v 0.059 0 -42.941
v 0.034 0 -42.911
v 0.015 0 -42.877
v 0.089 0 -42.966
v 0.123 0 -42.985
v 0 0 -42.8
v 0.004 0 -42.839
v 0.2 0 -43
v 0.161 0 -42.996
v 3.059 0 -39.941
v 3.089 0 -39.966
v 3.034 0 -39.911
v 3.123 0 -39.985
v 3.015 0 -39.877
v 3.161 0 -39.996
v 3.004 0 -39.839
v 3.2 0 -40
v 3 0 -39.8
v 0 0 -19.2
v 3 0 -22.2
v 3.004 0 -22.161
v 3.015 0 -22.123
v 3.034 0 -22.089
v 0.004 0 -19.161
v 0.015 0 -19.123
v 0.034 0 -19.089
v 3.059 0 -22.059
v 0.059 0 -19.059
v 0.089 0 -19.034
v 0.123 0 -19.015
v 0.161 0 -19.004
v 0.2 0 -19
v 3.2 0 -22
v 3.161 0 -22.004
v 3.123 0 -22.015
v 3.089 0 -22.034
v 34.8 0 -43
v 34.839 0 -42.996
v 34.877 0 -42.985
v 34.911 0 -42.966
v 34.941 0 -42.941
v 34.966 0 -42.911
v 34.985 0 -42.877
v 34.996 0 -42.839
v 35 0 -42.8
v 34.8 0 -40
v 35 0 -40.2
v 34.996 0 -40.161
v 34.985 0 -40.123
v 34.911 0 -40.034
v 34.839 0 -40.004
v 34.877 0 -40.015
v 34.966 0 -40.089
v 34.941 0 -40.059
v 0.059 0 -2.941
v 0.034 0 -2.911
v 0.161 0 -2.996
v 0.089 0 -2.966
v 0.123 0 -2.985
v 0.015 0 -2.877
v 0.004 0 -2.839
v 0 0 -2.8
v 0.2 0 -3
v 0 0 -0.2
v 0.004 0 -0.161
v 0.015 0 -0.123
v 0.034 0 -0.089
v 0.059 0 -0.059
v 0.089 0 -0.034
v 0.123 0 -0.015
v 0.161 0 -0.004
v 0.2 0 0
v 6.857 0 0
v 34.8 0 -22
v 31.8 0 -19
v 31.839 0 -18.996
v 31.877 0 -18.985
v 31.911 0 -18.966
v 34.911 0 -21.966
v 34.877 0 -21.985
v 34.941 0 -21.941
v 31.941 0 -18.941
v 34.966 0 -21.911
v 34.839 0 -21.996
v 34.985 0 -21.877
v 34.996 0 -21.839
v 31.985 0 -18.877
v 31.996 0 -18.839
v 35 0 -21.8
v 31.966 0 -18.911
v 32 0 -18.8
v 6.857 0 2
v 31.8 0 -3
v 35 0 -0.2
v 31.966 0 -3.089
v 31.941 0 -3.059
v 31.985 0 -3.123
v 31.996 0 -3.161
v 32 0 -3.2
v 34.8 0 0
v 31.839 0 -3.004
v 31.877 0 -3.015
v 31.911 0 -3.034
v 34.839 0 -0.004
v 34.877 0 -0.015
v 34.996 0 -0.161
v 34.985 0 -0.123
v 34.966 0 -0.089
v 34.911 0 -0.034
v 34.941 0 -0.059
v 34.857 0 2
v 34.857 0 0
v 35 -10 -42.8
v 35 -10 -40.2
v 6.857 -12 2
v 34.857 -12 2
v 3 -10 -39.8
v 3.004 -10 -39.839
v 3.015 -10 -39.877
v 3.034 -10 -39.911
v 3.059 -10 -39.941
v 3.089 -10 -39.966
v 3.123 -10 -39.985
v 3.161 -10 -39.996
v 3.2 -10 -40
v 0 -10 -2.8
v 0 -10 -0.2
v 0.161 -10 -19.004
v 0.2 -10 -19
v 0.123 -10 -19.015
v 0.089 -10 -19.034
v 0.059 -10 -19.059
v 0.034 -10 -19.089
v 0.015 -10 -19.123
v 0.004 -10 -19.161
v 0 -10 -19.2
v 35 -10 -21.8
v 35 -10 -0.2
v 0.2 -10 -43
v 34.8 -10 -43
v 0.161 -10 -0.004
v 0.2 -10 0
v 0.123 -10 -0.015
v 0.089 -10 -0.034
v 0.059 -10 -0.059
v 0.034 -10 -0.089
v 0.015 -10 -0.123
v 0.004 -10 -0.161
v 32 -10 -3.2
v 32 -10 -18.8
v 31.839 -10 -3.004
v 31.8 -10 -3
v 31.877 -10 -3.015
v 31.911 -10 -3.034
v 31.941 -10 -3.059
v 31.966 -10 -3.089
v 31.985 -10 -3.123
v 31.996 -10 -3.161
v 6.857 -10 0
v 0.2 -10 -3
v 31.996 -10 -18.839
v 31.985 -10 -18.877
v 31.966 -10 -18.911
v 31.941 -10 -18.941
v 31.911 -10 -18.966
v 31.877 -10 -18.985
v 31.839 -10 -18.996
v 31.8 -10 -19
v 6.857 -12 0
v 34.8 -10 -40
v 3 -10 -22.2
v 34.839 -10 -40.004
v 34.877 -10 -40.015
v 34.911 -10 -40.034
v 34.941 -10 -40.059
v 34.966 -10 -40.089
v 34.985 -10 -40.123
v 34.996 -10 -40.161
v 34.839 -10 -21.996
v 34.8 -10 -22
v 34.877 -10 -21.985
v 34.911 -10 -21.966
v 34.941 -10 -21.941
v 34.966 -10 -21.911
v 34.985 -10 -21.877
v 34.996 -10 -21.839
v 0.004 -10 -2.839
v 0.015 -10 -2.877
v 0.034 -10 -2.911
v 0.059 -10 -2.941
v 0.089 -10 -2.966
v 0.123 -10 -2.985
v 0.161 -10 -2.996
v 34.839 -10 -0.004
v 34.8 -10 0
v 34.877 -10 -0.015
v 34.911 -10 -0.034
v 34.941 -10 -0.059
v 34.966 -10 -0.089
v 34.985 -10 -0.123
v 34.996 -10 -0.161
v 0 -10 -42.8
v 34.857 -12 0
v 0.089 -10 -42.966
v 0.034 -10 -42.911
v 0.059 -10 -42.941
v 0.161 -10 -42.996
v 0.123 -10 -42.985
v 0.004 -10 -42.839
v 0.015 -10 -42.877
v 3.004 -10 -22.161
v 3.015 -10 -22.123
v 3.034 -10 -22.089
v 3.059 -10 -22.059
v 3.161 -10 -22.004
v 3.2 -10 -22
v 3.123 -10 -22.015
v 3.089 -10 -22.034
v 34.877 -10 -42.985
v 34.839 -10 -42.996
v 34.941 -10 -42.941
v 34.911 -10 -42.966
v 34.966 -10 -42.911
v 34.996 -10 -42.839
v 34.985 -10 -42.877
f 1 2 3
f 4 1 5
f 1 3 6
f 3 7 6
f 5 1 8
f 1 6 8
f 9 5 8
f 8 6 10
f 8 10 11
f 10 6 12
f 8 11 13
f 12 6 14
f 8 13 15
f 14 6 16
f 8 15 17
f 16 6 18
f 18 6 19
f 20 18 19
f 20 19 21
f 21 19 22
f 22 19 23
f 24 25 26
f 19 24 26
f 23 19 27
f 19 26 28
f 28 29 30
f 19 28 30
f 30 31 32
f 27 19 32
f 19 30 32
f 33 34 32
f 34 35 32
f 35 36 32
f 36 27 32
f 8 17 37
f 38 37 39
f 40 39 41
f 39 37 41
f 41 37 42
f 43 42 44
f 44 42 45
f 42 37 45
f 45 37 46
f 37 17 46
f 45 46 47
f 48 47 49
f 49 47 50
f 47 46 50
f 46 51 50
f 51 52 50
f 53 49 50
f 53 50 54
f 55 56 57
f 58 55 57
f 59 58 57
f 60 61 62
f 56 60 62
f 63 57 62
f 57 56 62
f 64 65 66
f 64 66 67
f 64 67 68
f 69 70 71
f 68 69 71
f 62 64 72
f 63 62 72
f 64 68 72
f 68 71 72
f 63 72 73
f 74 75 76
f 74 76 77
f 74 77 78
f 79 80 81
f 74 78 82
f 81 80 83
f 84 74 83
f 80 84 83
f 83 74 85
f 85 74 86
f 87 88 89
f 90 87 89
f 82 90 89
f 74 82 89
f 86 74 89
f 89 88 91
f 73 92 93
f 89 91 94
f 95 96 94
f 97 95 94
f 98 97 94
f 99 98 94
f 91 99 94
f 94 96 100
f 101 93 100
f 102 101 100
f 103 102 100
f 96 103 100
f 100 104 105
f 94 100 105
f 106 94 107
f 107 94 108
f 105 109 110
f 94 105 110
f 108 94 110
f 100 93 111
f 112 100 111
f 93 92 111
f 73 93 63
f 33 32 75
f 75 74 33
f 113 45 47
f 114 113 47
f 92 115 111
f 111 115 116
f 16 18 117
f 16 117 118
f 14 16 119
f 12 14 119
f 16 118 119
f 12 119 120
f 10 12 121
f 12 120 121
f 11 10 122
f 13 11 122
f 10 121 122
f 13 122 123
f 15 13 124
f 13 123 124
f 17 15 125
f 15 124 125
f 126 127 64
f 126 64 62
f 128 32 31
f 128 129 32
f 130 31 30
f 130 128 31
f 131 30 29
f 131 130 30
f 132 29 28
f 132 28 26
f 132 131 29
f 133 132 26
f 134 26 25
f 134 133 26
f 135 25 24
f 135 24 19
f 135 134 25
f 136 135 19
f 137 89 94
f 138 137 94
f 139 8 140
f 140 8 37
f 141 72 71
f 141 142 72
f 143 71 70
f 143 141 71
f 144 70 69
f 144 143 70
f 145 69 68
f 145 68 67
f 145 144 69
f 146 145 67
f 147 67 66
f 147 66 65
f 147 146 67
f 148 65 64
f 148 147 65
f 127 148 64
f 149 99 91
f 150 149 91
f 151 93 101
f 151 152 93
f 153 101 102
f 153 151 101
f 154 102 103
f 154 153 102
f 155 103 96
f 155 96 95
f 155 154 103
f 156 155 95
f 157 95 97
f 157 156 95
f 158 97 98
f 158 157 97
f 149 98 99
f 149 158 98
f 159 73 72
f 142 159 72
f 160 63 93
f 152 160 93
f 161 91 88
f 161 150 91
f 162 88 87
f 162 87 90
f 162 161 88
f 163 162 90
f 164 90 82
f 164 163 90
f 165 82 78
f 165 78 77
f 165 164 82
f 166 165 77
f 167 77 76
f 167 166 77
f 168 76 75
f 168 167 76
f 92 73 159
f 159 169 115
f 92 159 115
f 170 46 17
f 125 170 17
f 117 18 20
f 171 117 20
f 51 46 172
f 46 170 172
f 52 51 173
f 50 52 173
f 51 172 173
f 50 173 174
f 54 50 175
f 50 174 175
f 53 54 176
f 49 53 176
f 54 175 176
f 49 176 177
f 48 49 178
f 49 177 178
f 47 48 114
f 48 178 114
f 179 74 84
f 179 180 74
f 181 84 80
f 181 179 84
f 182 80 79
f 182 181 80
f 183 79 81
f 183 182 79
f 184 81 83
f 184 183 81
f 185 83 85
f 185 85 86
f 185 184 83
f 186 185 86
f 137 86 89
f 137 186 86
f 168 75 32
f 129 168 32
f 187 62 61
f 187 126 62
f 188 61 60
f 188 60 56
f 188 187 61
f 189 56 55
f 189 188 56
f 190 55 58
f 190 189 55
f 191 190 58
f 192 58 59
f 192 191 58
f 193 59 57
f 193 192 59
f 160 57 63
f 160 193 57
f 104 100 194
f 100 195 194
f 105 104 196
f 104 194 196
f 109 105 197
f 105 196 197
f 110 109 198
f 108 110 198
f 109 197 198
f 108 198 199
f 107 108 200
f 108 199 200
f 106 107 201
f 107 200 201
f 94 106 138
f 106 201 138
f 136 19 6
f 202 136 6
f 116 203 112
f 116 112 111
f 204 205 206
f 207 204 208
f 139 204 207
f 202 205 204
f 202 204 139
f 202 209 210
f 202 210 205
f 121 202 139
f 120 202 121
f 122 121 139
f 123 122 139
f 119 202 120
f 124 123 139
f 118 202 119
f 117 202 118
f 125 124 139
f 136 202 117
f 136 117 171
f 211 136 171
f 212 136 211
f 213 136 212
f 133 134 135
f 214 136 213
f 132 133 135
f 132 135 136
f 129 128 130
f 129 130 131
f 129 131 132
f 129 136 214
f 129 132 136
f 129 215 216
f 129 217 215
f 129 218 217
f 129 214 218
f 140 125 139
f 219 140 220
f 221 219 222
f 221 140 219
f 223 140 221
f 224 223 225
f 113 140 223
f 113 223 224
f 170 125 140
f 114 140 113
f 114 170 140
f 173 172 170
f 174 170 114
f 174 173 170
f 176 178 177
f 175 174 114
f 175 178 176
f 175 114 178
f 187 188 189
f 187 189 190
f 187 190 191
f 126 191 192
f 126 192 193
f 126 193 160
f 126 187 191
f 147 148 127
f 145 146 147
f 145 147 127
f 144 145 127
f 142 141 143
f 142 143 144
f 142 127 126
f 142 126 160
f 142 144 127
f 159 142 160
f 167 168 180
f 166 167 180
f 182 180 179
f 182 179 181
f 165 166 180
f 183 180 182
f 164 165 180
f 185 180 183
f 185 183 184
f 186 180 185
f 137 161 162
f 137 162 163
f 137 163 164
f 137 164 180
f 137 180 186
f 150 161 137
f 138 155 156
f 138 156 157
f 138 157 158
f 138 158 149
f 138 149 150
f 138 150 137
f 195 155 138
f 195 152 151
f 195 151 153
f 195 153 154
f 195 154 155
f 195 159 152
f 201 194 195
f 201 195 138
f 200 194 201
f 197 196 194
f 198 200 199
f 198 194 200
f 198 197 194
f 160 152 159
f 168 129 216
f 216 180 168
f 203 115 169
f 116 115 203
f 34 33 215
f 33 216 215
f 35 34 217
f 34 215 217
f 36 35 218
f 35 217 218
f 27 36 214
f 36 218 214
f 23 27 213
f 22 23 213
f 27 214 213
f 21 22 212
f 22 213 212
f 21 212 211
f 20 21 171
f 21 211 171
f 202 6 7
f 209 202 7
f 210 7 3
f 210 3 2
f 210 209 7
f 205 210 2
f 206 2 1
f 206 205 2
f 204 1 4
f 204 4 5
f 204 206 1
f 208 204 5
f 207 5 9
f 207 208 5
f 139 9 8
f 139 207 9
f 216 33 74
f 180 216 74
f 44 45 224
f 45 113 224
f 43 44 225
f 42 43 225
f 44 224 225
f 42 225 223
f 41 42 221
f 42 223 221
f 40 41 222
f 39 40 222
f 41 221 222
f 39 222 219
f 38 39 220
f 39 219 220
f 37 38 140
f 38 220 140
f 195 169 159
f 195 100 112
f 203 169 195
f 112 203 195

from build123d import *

# Parameters (mm, degrees)
F1_DEPTH = 10
F2_R     = 0.2
F3_R     = 0.2
F4_W     = 28
F4_H     = 2
F5_DEPTH = 25
F6_DEPTH = 13
F7_DEPTH = 12
F8_DEPTH = 1


with BuildPart() as f1:
    # F0 (on Front) → F1 (new body)
    with BuildSketch(Plane.XZ):
        Polygon((35, 0), (0, 0), (0, -3), (32, -3), (32, -18.9999993891), (0, -18.9999993891), (0, -43), (35, -43), (35, -39.9999991059), (3, -39.9999991059), (3, -21.9999998808), (35, -21.9999998808), align=None)
    extrude(amount=F1_DEPTH)

    # F2
    f2_edges = [f1.edges().sort_by_distance(p)[0] for p in [
        (35, -5, 0),
        (32, -5, -3),
        (35, -5, -22),
        (32, -5, -18.999999),
    ]]
    fillet(f2_edges, radius=F2_R)

    # F3
    f3_edges = [f1.edges().sort_by_distance(p)[0] for p in [
        (3, -5, -39.999999),
        (35, -5, -39.999999),
        (35, -5, -43),
        (0, -5, -43),
        (3, -5, -22),
        (0, -5, -18.999999),
        (0, -5, 0),
        (0, -5, -3),
    ]]
    fillet(f3_edges, radius=F3_R)

    # F4 (on Front) → F5 (join)
    with BuildSketch(Plane.XZ):
        with Locations((20.8566440605, 1)):
            Rectangle(F4_W, F4_H)
    extrude(amount=F5_DEPTH)

    # F6 (add): a face of the model
    f6_faces = [f1.faces().sort_by_distance(p)[0] for p in [
        (20.8566440605, -25, 1),
    ]]
    extrude(f6_faces, amount=-F6_DEPTH)

    # F7 (cut): a face of the model
    f7_faces = [f1.faces().sort_by_distance(p)[0] for p in [
        (20.8566440605, -25, 1),
    ]]
    extrude(f7_faces, amount=-F7_DEPTH, mode=Mode.SUBTRACT)

    # F8 (cut): a face of the model
    f8_faces = [f1.faces().sort_by_distance(p)[0] for p in [
        (20.8566440605, -13, 1),
    ]]
    extrude(f8_faces, amount=-F8_DEPTH, mode=Mode.SUBTRACT)


solid = f1.part
